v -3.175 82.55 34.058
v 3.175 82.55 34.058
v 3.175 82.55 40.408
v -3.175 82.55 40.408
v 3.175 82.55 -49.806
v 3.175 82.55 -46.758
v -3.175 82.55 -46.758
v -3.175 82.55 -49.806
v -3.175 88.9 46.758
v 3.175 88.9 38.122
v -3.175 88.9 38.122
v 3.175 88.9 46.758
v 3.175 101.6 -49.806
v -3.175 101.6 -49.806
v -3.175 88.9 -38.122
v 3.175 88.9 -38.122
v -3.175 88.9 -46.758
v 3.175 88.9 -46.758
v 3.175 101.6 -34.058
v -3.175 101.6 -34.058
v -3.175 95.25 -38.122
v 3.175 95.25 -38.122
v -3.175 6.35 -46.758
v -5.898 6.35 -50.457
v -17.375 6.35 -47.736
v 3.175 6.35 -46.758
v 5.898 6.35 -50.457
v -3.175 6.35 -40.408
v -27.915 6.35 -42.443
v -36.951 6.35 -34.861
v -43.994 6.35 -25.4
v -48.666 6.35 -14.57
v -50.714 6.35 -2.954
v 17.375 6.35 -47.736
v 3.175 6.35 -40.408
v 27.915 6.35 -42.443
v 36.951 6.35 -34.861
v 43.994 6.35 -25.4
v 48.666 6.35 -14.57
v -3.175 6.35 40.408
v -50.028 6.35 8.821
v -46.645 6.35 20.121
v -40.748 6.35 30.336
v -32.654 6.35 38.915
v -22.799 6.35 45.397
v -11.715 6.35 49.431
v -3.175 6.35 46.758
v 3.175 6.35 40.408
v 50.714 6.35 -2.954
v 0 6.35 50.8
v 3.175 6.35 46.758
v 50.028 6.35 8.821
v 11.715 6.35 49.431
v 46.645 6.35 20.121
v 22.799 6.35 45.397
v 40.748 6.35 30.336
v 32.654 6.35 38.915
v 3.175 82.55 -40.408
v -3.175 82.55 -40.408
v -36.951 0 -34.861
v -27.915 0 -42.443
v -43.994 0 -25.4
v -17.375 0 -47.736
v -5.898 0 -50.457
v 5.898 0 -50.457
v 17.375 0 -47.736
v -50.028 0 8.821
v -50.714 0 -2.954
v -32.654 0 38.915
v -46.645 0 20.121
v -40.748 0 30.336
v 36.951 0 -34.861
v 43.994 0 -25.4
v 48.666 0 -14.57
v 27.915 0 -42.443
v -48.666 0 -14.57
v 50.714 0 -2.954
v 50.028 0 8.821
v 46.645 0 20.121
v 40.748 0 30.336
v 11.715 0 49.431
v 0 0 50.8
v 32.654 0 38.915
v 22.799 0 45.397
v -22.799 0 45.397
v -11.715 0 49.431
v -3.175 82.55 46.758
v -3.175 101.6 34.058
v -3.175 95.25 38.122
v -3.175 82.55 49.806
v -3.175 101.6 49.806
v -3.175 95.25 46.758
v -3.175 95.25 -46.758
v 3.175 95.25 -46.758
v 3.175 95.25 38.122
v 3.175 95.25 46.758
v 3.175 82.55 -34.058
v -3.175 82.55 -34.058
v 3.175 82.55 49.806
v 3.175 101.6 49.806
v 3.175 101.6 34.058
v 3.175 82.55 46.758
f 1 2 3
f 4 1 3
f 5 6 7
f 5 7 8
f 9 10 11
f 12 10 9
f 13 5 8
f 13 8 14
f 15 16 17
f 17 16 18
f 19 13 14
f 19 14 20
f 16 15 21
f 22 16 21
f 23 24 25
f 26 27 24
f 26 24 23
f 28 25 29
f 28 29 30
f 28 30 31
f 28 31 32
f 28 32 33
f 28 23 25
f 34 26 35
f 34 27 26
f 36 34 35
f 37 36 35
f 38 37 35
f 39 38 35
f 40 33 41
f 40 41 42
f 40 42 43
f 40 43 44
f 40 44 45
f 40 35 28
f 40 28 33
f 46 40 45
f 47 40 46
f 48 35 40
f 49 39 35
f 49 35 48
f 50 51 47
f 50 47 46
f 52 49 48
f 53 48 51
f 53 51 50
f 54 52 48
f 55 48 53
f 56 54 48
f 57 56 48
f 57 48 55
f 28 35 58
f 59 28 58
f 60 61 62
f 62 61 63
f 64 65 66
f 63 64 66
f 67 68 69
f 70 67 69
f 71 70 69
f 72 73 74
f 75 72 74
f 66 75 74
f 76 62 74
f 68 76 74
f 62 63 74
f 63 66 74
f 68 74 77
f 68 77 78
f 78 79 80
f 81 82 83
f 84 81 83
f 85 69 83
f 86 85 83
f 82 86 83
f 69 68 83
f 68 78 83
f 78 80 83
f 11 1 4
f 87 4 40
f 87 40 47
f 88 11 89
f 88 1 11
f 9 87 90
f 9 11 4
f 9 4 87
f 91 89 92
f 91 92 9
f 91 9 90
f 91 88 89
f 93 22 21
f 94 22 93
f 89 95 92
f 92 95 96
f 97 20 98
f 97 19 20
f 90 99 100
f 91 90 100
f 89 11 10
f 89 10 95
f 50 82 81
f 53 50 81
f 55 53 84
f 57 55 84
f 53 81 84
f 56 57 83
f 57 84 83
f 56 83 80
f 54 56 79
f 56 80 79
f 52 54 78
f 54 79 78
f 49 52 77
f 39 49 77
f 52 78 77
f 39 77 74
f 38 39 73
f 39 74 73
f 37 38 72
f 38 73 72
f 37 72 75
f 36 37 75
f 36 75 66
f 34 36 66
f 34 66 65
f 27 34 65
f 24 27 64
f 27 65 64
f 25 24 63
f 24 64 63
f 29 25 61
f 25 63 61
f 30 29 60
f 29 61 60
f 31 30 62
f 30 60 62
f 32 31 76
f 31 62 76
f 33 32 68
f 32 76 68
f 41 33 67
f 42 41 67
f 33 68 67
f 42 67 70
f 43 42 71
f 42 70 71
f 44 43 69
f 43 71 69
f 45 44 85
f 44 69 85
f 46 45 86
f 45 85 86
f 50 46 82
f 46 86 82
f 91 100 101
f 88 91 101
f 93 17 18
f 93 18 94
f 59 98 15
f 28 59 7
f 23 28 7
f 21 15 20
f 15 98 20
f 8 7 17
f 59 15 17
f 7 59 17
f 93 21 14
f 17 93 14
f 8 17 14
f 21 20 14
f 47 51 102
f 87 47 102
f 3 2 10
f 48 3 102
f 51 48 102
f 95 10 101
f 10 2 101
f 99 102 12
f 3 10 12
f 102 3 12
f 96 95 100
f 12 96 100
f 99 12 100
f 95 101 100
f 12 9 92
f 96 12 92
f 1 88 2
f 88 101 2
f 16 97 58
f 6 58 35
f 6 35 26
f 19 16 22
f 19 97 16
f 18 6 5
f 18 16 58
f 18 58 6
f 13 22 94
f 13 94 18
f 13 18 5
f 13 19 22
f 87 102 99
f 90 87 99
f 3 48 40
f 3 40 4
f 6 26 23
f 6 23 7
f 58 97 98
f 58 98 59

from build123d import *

# Parameters (mm, degrees)
SKETCH1_R           = 50.8
BOSS_EXTRUDE1_DEPTH = 6.35
SKETCH9_W           = 8.636
SKETCH9_H           = 6.35
BOSS_EXTRUDE5_DEPTH = 3.175


with BuildPart() as part:
    # Sketch1 → Boss-Extrude1 (new body)
    with BuildSketch(Plane(origin=(0, 0, 0), x_dir=(1, 0, 0), z_dir=(0, 1, 0))):
        Circle(SKETCH1_R)
    extrude(amount=BOSS_EXTRUDE1_DEPTH)

    # Sketch9 → Boss-Extrude5 (add, symmetric)
    with BuildSketch(Plane(origin=(0, 0, 0), x_dir=(0, 0, -1), z_dir=(1, 0, 0))):
        Polygon((40.408352, 82.55), (40.408352, 6.35), (46.758352, 6.35), (46.758352, 82.55), (49.806352, 82.55), (49.806352, 101.6), (34.058352, 101.6), (34.058352, 82.55), align=None)
        with Locations((42.440352, 92.075)):
            Rectangle(SKETCH9_W, SKETCH9_H, mode=Mode.SUBTRACT)
    boss_extrude5 = extrude(amount=BOSS_EXTRUDE5_DEPTH, both=True)

    # Mirror1: Boss-Extrude5 across plane
    add(boss_extrude5.mirror(Plane.XY))


solid = part.part
